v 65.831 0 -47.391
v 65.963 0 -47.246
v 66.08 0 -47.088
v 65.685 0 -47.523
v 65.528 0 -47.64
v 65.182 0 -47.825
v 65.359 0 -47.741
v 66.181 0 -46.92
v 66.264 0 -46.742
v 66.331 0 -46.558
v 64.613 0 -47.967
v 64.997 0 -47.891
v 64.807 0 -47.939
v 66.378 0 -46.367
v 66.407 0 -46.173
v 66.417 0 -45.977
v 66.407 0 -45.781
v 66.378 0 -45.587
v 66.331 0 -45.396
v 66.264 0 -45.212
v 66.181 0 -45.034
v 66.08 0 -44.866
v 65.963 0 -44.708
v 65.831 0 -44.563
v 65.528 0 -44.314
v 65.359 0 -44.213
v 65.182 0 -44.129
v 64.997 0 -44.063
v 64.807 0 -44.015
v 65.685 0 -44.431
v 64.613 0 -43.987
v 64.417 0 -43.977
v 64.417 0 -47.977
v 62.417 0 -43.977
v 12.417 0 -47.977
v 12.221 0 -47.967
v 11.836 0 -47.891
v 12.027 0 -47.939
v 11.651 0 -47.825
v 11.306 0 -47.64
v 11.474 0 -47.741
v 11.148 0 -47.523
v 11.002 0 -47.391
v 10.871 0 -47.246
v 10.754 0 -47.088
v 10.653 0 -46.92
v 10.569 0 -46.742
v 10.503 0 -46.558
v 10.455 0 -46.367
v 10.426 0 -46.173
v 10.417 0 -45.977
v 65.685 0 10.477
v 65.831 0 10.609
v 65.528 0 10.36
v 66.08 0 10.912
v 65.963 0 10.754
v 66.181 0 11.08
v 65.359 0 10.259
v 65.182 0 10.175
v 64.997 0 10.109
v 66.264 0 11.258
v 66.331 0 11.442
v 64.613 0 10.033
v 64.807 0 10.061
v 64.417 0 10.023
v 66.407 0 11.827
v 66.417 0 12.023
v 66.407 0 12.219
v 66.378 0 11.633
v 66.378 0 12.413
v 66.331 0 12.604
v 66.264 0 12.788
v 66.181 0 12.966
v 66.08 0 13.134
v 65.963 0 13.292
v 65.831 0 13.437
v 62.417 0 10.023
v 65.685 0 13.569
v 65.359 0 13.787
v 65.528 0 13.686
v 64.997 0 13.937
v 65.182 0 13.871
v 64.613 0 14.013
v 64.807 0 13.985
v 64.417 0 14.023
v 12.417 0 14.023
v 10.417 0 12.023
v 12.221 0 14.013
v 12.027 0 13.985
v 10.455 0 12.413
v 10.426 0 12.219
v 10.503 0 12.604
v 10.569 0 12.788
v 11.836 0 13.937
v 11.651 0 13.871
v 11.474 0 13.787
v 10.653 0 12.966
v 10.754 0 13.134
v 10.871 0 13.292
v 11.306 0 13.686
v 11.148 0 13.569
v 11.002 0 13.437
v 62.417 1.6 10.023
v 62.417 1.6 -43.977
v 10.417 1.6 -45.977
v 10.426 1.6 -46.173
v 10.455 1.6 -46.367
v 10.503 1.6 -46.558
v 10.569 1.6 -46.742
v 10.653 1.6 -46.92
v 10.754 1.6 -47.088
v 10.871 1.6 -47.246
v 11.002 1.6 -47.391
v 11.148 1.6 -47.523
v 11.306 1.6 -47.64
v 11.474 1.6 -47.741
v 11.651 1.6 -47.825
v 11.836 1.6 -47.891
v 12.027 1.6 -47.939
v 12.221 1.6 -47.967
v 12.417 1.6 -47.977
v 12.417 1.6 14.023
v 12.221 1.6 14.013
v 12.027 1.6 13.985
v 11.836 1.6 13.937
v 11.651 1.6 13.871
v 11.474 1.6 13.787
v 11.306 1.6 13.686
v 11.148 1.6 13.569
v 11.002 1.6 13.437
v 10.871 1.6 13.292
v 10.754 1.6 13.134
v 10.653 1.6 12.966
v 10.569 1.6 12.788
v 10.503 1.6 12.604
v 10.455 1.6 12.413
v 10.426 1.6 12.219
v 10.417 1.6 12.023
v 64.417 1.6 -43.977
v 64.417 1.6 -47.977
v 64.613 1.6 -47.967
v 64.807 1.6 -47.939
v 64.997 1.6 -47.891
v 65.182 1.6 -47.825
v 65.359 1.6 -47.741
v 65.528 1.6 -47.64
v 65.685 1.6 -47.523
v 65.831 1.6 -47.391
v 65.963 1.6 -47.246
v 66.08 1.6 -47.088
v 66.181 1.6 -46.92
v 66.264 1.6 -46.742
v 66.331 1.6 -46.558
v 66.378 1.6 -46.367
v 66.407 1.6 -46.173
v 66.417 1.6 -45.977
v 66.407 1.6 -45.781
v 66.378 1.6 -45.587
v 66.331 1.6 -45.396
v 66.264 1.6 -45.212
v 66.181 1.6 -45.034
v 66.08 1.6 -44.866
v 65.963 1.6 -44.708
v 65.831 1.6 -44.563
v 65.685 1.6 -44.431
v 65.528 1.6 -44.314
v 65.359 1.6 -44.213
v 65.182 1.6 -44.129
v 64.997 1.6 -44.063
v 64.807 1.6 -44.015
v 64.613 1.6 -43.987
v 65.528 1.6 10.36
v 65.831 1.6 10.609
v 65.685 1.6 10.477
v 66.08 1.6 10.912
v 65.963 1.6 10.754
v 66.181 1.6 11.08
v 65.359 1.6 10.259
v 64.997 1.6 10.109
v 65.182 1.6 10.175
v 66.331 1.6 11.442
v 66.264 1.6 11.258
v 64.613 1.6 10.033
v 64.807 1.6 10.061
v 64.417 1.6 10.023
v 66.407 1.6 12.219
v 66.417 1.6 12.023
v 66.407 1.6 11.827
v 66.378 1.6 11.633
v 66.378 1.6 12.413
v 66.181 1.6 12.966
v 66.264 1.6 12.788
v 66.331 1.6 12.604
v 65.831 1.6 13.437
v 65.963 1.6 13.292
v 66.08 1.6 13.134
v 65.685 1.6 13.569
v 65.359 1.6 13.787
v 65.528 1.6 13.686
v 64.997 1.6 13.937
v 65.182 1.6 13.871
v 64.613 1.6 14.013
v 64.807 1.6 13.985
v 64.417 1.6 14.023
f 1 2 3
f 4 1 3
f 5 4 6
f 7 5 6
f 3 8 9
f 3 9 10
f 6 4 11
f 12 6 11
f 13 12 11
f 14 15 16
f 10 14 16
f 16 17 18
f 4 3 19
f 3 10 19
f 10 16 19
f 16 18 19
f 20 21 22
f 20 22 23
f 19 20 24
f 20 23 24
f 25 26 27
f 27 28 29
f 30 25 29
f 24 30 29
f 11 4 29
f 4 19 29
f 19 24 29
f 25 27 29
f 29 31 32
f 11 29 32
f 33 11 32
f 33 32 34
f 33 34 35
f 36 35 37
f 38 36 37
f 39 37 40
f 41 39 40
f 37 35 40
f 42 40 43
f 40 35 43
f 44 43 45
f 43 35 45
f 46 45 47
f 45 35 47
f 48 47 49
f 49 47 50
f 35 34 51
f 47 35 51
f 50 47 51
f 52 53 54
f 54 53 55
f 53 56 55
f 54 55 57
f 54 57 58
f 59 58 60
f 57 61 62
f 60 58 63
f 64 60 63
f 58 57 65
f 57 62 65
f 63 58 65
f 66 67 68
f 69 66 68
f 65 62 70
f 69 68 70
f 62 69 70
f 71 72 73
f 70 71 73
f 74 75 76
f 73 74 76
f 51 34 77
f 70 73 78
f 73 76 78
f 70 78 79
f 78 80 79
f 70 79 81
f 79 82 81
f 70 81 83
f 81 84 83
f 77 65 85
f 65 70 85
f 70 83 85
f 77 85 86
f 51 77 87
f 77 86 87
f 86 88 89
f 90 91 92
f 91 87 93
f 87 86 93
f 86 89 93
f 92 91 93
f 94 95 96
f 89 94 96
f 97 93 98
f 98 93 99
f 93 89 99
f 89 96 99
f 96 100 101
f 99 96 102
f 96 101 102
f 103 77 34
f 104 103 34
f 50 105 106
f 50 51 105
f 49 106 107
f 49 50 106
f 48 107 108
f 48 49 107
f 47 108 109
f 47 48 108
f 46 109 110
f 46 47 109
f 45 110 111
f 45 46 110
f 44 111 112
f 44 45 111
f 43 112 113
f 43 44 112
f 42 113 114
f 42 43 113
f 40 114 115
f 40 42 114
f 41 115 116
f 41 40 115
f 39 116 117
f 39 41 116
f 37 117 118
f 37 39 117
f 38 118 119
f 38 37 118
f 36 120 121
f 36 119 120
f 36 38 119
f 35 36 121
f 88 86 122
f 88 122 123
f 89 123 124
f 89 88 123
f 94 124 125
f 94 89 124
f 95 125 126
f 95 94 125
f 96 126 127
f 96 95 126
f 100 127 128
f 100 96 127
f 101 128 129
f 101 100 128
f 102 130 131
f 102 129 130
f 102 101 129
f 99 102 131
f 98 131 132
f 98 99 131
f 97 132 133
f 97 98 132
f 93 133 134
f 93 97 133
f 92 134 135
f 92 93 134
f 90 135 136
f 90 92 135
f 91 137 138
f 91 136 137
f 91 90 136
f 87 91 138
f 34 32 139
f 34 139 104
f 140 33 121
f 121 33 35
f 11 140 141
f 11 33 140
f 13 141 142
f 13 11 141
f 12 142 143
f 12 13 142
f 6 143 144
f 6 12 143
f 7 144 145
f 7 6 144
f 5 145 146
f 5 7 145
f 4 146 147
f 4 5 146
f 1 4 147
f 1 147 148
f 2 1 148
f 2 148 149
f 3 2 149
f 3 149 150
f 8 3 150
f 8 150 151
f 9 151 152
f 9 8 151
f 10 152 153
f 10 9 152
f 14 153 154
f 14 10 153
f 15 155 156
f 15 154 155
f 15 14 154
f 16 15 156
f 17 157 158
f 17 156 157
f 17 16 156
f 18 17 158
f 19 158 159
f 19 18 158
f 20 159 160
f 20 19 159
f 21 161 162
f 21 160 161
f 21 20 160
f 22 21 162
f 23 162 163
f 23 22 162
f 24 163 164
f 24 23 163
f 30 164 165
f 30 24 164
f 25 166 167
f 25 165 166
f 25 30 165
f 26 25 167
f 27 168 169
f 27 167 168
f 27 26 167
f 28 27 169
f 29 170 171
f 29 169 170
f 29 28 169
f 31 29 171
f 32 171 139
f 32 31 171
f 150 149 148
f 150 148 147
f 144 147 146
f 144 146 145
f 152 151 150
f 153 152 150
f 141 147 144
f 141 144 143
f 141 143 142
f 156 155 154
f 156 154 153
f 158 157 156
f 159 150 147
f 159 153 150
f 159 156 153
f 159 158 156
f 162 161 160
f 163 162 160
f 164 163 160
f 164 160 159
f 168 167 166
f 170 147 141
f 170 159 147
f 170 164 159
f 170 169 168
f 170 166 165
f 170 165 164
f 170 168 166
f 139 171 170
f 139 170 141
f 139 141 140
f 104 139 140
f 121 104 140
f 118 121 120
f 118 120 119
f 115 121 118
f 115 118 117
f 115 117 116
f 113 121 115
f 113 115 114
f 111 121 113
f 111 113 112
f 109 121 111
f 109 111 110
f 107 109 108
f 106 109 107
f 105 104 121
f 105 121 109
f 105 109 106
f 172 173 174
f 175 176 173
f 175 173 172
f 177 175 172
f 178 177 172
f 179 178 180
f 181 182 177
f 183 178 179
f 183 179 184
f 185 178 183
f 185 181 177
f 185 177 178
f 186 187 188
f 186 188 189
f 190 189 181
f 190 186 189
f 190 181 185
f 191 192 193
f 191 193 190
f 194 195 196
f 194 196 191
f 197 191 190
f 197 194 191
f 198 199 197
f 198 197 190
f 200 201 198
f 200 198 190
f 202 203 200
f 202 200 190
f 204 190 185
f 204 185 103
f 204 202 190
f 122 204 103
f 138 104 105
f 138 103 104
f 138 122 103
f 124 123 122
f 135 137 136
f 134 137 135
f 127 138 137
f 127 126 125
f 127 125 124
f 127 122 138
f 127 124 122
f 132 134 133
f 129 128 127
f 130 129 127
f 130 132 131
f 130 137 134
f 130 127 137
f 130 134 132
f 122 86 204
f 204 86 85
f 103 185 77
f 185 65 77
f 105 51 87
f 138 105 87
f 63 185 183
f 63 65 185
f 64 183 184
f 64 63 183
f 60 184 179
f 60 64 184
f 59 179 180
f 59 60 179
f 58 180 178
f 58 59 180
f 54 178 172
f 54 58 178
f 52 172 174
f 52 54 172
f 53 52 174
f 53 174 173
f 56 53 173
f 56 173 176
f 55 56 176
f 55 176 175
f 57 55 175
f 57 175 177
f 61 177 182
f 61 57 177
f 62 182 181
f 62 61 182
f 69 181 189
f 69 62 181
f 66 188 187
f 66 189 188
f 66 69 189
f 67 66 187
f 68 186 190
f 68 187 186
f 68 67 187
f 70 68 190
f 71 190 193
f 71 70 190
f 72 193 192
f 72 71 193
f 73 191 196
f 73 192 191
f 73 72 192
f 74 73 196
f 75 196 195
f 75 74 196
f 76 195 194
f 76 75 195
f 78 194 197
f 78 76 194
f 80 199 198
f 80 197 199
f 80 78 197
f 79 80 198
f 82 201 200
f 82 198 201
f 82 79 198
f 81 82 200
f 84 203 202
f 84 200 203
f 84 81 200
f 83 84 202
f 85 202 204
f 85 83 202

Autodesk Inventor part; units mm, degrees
ref_plane "YZ Plane" through (0, 0, 0) normal (1, 0, 0) x (0, 1, 0)
ref_plane "XZ Plane" through (0, 0, 0) normal (0, 1, 0) x (-1, 0, 0)
ref_plane "XY Plane" through (0, 0, 0) normal (0, 0, 1) x (1, 0, 0)
sketch "Sketch1" plane through (0, 0, 0) normal (0, 1, 0) x (-1, 0, 0)
  line L0 (-10.4167, 14.023) -> (-62.4167, 14.023)
  line L1 (-62.4167, 14.023) -> (-62.4167, -47.977)
  line L2 (-62.4167, -47.977) -> (-10.4167, -47.977)
  line L3 (-10.4167, -47.977) -> (-10.4167, 14.023)
  circle A0 centre (-64.4167, -45.977) radius 2
  line L4 (-64.4167, -43.977) -> (-62.4167, -43.977)
  line L5 (-64.4167, -47.977) -> (-62.4167, -47.977)
  circle A1 centre (-12.4167, 12.023) radius 2
  circle A2 centre (-12.4167, -45.977) radius 2
  circle A3 centre (-64.4167, 12.023) radius 2
  line L6 (-64.4167, 14.023) -> (-62.4167, 14.023)
  line L7 (-64.4167, 10.023) -> (-62.4167, 10.023)
  point P0 (0, 0)
  point P1 (-10.4167, -45.977)
  point P2 (-10.4167, 12.023)
  point P3 (-12.4167, 14.023)
  point P4 (-12.4167, -47.977)
  dimension "d0" = 52
  dimension "d1" = 62
  dimension "d2" = 4
  dimension "d3" = 2
  dimension "d4" = 2
  dimension "d5" = 4
  dimension "d6" = 4
  dimension "d7" = 4
  dimension "d8" = 2
  dimension "d9" = 2
extrude "Extrusion1" add sketch "Sketch1" along normal blind 1.6 contours A1 L3 A2 L2 L1 L0 | A1 | L1 A3 L6 | A2 | A3 | L1 L7 A3 | L5 A0 L1 | L1 A0 L4 | A0
properties part number "Płytka"
